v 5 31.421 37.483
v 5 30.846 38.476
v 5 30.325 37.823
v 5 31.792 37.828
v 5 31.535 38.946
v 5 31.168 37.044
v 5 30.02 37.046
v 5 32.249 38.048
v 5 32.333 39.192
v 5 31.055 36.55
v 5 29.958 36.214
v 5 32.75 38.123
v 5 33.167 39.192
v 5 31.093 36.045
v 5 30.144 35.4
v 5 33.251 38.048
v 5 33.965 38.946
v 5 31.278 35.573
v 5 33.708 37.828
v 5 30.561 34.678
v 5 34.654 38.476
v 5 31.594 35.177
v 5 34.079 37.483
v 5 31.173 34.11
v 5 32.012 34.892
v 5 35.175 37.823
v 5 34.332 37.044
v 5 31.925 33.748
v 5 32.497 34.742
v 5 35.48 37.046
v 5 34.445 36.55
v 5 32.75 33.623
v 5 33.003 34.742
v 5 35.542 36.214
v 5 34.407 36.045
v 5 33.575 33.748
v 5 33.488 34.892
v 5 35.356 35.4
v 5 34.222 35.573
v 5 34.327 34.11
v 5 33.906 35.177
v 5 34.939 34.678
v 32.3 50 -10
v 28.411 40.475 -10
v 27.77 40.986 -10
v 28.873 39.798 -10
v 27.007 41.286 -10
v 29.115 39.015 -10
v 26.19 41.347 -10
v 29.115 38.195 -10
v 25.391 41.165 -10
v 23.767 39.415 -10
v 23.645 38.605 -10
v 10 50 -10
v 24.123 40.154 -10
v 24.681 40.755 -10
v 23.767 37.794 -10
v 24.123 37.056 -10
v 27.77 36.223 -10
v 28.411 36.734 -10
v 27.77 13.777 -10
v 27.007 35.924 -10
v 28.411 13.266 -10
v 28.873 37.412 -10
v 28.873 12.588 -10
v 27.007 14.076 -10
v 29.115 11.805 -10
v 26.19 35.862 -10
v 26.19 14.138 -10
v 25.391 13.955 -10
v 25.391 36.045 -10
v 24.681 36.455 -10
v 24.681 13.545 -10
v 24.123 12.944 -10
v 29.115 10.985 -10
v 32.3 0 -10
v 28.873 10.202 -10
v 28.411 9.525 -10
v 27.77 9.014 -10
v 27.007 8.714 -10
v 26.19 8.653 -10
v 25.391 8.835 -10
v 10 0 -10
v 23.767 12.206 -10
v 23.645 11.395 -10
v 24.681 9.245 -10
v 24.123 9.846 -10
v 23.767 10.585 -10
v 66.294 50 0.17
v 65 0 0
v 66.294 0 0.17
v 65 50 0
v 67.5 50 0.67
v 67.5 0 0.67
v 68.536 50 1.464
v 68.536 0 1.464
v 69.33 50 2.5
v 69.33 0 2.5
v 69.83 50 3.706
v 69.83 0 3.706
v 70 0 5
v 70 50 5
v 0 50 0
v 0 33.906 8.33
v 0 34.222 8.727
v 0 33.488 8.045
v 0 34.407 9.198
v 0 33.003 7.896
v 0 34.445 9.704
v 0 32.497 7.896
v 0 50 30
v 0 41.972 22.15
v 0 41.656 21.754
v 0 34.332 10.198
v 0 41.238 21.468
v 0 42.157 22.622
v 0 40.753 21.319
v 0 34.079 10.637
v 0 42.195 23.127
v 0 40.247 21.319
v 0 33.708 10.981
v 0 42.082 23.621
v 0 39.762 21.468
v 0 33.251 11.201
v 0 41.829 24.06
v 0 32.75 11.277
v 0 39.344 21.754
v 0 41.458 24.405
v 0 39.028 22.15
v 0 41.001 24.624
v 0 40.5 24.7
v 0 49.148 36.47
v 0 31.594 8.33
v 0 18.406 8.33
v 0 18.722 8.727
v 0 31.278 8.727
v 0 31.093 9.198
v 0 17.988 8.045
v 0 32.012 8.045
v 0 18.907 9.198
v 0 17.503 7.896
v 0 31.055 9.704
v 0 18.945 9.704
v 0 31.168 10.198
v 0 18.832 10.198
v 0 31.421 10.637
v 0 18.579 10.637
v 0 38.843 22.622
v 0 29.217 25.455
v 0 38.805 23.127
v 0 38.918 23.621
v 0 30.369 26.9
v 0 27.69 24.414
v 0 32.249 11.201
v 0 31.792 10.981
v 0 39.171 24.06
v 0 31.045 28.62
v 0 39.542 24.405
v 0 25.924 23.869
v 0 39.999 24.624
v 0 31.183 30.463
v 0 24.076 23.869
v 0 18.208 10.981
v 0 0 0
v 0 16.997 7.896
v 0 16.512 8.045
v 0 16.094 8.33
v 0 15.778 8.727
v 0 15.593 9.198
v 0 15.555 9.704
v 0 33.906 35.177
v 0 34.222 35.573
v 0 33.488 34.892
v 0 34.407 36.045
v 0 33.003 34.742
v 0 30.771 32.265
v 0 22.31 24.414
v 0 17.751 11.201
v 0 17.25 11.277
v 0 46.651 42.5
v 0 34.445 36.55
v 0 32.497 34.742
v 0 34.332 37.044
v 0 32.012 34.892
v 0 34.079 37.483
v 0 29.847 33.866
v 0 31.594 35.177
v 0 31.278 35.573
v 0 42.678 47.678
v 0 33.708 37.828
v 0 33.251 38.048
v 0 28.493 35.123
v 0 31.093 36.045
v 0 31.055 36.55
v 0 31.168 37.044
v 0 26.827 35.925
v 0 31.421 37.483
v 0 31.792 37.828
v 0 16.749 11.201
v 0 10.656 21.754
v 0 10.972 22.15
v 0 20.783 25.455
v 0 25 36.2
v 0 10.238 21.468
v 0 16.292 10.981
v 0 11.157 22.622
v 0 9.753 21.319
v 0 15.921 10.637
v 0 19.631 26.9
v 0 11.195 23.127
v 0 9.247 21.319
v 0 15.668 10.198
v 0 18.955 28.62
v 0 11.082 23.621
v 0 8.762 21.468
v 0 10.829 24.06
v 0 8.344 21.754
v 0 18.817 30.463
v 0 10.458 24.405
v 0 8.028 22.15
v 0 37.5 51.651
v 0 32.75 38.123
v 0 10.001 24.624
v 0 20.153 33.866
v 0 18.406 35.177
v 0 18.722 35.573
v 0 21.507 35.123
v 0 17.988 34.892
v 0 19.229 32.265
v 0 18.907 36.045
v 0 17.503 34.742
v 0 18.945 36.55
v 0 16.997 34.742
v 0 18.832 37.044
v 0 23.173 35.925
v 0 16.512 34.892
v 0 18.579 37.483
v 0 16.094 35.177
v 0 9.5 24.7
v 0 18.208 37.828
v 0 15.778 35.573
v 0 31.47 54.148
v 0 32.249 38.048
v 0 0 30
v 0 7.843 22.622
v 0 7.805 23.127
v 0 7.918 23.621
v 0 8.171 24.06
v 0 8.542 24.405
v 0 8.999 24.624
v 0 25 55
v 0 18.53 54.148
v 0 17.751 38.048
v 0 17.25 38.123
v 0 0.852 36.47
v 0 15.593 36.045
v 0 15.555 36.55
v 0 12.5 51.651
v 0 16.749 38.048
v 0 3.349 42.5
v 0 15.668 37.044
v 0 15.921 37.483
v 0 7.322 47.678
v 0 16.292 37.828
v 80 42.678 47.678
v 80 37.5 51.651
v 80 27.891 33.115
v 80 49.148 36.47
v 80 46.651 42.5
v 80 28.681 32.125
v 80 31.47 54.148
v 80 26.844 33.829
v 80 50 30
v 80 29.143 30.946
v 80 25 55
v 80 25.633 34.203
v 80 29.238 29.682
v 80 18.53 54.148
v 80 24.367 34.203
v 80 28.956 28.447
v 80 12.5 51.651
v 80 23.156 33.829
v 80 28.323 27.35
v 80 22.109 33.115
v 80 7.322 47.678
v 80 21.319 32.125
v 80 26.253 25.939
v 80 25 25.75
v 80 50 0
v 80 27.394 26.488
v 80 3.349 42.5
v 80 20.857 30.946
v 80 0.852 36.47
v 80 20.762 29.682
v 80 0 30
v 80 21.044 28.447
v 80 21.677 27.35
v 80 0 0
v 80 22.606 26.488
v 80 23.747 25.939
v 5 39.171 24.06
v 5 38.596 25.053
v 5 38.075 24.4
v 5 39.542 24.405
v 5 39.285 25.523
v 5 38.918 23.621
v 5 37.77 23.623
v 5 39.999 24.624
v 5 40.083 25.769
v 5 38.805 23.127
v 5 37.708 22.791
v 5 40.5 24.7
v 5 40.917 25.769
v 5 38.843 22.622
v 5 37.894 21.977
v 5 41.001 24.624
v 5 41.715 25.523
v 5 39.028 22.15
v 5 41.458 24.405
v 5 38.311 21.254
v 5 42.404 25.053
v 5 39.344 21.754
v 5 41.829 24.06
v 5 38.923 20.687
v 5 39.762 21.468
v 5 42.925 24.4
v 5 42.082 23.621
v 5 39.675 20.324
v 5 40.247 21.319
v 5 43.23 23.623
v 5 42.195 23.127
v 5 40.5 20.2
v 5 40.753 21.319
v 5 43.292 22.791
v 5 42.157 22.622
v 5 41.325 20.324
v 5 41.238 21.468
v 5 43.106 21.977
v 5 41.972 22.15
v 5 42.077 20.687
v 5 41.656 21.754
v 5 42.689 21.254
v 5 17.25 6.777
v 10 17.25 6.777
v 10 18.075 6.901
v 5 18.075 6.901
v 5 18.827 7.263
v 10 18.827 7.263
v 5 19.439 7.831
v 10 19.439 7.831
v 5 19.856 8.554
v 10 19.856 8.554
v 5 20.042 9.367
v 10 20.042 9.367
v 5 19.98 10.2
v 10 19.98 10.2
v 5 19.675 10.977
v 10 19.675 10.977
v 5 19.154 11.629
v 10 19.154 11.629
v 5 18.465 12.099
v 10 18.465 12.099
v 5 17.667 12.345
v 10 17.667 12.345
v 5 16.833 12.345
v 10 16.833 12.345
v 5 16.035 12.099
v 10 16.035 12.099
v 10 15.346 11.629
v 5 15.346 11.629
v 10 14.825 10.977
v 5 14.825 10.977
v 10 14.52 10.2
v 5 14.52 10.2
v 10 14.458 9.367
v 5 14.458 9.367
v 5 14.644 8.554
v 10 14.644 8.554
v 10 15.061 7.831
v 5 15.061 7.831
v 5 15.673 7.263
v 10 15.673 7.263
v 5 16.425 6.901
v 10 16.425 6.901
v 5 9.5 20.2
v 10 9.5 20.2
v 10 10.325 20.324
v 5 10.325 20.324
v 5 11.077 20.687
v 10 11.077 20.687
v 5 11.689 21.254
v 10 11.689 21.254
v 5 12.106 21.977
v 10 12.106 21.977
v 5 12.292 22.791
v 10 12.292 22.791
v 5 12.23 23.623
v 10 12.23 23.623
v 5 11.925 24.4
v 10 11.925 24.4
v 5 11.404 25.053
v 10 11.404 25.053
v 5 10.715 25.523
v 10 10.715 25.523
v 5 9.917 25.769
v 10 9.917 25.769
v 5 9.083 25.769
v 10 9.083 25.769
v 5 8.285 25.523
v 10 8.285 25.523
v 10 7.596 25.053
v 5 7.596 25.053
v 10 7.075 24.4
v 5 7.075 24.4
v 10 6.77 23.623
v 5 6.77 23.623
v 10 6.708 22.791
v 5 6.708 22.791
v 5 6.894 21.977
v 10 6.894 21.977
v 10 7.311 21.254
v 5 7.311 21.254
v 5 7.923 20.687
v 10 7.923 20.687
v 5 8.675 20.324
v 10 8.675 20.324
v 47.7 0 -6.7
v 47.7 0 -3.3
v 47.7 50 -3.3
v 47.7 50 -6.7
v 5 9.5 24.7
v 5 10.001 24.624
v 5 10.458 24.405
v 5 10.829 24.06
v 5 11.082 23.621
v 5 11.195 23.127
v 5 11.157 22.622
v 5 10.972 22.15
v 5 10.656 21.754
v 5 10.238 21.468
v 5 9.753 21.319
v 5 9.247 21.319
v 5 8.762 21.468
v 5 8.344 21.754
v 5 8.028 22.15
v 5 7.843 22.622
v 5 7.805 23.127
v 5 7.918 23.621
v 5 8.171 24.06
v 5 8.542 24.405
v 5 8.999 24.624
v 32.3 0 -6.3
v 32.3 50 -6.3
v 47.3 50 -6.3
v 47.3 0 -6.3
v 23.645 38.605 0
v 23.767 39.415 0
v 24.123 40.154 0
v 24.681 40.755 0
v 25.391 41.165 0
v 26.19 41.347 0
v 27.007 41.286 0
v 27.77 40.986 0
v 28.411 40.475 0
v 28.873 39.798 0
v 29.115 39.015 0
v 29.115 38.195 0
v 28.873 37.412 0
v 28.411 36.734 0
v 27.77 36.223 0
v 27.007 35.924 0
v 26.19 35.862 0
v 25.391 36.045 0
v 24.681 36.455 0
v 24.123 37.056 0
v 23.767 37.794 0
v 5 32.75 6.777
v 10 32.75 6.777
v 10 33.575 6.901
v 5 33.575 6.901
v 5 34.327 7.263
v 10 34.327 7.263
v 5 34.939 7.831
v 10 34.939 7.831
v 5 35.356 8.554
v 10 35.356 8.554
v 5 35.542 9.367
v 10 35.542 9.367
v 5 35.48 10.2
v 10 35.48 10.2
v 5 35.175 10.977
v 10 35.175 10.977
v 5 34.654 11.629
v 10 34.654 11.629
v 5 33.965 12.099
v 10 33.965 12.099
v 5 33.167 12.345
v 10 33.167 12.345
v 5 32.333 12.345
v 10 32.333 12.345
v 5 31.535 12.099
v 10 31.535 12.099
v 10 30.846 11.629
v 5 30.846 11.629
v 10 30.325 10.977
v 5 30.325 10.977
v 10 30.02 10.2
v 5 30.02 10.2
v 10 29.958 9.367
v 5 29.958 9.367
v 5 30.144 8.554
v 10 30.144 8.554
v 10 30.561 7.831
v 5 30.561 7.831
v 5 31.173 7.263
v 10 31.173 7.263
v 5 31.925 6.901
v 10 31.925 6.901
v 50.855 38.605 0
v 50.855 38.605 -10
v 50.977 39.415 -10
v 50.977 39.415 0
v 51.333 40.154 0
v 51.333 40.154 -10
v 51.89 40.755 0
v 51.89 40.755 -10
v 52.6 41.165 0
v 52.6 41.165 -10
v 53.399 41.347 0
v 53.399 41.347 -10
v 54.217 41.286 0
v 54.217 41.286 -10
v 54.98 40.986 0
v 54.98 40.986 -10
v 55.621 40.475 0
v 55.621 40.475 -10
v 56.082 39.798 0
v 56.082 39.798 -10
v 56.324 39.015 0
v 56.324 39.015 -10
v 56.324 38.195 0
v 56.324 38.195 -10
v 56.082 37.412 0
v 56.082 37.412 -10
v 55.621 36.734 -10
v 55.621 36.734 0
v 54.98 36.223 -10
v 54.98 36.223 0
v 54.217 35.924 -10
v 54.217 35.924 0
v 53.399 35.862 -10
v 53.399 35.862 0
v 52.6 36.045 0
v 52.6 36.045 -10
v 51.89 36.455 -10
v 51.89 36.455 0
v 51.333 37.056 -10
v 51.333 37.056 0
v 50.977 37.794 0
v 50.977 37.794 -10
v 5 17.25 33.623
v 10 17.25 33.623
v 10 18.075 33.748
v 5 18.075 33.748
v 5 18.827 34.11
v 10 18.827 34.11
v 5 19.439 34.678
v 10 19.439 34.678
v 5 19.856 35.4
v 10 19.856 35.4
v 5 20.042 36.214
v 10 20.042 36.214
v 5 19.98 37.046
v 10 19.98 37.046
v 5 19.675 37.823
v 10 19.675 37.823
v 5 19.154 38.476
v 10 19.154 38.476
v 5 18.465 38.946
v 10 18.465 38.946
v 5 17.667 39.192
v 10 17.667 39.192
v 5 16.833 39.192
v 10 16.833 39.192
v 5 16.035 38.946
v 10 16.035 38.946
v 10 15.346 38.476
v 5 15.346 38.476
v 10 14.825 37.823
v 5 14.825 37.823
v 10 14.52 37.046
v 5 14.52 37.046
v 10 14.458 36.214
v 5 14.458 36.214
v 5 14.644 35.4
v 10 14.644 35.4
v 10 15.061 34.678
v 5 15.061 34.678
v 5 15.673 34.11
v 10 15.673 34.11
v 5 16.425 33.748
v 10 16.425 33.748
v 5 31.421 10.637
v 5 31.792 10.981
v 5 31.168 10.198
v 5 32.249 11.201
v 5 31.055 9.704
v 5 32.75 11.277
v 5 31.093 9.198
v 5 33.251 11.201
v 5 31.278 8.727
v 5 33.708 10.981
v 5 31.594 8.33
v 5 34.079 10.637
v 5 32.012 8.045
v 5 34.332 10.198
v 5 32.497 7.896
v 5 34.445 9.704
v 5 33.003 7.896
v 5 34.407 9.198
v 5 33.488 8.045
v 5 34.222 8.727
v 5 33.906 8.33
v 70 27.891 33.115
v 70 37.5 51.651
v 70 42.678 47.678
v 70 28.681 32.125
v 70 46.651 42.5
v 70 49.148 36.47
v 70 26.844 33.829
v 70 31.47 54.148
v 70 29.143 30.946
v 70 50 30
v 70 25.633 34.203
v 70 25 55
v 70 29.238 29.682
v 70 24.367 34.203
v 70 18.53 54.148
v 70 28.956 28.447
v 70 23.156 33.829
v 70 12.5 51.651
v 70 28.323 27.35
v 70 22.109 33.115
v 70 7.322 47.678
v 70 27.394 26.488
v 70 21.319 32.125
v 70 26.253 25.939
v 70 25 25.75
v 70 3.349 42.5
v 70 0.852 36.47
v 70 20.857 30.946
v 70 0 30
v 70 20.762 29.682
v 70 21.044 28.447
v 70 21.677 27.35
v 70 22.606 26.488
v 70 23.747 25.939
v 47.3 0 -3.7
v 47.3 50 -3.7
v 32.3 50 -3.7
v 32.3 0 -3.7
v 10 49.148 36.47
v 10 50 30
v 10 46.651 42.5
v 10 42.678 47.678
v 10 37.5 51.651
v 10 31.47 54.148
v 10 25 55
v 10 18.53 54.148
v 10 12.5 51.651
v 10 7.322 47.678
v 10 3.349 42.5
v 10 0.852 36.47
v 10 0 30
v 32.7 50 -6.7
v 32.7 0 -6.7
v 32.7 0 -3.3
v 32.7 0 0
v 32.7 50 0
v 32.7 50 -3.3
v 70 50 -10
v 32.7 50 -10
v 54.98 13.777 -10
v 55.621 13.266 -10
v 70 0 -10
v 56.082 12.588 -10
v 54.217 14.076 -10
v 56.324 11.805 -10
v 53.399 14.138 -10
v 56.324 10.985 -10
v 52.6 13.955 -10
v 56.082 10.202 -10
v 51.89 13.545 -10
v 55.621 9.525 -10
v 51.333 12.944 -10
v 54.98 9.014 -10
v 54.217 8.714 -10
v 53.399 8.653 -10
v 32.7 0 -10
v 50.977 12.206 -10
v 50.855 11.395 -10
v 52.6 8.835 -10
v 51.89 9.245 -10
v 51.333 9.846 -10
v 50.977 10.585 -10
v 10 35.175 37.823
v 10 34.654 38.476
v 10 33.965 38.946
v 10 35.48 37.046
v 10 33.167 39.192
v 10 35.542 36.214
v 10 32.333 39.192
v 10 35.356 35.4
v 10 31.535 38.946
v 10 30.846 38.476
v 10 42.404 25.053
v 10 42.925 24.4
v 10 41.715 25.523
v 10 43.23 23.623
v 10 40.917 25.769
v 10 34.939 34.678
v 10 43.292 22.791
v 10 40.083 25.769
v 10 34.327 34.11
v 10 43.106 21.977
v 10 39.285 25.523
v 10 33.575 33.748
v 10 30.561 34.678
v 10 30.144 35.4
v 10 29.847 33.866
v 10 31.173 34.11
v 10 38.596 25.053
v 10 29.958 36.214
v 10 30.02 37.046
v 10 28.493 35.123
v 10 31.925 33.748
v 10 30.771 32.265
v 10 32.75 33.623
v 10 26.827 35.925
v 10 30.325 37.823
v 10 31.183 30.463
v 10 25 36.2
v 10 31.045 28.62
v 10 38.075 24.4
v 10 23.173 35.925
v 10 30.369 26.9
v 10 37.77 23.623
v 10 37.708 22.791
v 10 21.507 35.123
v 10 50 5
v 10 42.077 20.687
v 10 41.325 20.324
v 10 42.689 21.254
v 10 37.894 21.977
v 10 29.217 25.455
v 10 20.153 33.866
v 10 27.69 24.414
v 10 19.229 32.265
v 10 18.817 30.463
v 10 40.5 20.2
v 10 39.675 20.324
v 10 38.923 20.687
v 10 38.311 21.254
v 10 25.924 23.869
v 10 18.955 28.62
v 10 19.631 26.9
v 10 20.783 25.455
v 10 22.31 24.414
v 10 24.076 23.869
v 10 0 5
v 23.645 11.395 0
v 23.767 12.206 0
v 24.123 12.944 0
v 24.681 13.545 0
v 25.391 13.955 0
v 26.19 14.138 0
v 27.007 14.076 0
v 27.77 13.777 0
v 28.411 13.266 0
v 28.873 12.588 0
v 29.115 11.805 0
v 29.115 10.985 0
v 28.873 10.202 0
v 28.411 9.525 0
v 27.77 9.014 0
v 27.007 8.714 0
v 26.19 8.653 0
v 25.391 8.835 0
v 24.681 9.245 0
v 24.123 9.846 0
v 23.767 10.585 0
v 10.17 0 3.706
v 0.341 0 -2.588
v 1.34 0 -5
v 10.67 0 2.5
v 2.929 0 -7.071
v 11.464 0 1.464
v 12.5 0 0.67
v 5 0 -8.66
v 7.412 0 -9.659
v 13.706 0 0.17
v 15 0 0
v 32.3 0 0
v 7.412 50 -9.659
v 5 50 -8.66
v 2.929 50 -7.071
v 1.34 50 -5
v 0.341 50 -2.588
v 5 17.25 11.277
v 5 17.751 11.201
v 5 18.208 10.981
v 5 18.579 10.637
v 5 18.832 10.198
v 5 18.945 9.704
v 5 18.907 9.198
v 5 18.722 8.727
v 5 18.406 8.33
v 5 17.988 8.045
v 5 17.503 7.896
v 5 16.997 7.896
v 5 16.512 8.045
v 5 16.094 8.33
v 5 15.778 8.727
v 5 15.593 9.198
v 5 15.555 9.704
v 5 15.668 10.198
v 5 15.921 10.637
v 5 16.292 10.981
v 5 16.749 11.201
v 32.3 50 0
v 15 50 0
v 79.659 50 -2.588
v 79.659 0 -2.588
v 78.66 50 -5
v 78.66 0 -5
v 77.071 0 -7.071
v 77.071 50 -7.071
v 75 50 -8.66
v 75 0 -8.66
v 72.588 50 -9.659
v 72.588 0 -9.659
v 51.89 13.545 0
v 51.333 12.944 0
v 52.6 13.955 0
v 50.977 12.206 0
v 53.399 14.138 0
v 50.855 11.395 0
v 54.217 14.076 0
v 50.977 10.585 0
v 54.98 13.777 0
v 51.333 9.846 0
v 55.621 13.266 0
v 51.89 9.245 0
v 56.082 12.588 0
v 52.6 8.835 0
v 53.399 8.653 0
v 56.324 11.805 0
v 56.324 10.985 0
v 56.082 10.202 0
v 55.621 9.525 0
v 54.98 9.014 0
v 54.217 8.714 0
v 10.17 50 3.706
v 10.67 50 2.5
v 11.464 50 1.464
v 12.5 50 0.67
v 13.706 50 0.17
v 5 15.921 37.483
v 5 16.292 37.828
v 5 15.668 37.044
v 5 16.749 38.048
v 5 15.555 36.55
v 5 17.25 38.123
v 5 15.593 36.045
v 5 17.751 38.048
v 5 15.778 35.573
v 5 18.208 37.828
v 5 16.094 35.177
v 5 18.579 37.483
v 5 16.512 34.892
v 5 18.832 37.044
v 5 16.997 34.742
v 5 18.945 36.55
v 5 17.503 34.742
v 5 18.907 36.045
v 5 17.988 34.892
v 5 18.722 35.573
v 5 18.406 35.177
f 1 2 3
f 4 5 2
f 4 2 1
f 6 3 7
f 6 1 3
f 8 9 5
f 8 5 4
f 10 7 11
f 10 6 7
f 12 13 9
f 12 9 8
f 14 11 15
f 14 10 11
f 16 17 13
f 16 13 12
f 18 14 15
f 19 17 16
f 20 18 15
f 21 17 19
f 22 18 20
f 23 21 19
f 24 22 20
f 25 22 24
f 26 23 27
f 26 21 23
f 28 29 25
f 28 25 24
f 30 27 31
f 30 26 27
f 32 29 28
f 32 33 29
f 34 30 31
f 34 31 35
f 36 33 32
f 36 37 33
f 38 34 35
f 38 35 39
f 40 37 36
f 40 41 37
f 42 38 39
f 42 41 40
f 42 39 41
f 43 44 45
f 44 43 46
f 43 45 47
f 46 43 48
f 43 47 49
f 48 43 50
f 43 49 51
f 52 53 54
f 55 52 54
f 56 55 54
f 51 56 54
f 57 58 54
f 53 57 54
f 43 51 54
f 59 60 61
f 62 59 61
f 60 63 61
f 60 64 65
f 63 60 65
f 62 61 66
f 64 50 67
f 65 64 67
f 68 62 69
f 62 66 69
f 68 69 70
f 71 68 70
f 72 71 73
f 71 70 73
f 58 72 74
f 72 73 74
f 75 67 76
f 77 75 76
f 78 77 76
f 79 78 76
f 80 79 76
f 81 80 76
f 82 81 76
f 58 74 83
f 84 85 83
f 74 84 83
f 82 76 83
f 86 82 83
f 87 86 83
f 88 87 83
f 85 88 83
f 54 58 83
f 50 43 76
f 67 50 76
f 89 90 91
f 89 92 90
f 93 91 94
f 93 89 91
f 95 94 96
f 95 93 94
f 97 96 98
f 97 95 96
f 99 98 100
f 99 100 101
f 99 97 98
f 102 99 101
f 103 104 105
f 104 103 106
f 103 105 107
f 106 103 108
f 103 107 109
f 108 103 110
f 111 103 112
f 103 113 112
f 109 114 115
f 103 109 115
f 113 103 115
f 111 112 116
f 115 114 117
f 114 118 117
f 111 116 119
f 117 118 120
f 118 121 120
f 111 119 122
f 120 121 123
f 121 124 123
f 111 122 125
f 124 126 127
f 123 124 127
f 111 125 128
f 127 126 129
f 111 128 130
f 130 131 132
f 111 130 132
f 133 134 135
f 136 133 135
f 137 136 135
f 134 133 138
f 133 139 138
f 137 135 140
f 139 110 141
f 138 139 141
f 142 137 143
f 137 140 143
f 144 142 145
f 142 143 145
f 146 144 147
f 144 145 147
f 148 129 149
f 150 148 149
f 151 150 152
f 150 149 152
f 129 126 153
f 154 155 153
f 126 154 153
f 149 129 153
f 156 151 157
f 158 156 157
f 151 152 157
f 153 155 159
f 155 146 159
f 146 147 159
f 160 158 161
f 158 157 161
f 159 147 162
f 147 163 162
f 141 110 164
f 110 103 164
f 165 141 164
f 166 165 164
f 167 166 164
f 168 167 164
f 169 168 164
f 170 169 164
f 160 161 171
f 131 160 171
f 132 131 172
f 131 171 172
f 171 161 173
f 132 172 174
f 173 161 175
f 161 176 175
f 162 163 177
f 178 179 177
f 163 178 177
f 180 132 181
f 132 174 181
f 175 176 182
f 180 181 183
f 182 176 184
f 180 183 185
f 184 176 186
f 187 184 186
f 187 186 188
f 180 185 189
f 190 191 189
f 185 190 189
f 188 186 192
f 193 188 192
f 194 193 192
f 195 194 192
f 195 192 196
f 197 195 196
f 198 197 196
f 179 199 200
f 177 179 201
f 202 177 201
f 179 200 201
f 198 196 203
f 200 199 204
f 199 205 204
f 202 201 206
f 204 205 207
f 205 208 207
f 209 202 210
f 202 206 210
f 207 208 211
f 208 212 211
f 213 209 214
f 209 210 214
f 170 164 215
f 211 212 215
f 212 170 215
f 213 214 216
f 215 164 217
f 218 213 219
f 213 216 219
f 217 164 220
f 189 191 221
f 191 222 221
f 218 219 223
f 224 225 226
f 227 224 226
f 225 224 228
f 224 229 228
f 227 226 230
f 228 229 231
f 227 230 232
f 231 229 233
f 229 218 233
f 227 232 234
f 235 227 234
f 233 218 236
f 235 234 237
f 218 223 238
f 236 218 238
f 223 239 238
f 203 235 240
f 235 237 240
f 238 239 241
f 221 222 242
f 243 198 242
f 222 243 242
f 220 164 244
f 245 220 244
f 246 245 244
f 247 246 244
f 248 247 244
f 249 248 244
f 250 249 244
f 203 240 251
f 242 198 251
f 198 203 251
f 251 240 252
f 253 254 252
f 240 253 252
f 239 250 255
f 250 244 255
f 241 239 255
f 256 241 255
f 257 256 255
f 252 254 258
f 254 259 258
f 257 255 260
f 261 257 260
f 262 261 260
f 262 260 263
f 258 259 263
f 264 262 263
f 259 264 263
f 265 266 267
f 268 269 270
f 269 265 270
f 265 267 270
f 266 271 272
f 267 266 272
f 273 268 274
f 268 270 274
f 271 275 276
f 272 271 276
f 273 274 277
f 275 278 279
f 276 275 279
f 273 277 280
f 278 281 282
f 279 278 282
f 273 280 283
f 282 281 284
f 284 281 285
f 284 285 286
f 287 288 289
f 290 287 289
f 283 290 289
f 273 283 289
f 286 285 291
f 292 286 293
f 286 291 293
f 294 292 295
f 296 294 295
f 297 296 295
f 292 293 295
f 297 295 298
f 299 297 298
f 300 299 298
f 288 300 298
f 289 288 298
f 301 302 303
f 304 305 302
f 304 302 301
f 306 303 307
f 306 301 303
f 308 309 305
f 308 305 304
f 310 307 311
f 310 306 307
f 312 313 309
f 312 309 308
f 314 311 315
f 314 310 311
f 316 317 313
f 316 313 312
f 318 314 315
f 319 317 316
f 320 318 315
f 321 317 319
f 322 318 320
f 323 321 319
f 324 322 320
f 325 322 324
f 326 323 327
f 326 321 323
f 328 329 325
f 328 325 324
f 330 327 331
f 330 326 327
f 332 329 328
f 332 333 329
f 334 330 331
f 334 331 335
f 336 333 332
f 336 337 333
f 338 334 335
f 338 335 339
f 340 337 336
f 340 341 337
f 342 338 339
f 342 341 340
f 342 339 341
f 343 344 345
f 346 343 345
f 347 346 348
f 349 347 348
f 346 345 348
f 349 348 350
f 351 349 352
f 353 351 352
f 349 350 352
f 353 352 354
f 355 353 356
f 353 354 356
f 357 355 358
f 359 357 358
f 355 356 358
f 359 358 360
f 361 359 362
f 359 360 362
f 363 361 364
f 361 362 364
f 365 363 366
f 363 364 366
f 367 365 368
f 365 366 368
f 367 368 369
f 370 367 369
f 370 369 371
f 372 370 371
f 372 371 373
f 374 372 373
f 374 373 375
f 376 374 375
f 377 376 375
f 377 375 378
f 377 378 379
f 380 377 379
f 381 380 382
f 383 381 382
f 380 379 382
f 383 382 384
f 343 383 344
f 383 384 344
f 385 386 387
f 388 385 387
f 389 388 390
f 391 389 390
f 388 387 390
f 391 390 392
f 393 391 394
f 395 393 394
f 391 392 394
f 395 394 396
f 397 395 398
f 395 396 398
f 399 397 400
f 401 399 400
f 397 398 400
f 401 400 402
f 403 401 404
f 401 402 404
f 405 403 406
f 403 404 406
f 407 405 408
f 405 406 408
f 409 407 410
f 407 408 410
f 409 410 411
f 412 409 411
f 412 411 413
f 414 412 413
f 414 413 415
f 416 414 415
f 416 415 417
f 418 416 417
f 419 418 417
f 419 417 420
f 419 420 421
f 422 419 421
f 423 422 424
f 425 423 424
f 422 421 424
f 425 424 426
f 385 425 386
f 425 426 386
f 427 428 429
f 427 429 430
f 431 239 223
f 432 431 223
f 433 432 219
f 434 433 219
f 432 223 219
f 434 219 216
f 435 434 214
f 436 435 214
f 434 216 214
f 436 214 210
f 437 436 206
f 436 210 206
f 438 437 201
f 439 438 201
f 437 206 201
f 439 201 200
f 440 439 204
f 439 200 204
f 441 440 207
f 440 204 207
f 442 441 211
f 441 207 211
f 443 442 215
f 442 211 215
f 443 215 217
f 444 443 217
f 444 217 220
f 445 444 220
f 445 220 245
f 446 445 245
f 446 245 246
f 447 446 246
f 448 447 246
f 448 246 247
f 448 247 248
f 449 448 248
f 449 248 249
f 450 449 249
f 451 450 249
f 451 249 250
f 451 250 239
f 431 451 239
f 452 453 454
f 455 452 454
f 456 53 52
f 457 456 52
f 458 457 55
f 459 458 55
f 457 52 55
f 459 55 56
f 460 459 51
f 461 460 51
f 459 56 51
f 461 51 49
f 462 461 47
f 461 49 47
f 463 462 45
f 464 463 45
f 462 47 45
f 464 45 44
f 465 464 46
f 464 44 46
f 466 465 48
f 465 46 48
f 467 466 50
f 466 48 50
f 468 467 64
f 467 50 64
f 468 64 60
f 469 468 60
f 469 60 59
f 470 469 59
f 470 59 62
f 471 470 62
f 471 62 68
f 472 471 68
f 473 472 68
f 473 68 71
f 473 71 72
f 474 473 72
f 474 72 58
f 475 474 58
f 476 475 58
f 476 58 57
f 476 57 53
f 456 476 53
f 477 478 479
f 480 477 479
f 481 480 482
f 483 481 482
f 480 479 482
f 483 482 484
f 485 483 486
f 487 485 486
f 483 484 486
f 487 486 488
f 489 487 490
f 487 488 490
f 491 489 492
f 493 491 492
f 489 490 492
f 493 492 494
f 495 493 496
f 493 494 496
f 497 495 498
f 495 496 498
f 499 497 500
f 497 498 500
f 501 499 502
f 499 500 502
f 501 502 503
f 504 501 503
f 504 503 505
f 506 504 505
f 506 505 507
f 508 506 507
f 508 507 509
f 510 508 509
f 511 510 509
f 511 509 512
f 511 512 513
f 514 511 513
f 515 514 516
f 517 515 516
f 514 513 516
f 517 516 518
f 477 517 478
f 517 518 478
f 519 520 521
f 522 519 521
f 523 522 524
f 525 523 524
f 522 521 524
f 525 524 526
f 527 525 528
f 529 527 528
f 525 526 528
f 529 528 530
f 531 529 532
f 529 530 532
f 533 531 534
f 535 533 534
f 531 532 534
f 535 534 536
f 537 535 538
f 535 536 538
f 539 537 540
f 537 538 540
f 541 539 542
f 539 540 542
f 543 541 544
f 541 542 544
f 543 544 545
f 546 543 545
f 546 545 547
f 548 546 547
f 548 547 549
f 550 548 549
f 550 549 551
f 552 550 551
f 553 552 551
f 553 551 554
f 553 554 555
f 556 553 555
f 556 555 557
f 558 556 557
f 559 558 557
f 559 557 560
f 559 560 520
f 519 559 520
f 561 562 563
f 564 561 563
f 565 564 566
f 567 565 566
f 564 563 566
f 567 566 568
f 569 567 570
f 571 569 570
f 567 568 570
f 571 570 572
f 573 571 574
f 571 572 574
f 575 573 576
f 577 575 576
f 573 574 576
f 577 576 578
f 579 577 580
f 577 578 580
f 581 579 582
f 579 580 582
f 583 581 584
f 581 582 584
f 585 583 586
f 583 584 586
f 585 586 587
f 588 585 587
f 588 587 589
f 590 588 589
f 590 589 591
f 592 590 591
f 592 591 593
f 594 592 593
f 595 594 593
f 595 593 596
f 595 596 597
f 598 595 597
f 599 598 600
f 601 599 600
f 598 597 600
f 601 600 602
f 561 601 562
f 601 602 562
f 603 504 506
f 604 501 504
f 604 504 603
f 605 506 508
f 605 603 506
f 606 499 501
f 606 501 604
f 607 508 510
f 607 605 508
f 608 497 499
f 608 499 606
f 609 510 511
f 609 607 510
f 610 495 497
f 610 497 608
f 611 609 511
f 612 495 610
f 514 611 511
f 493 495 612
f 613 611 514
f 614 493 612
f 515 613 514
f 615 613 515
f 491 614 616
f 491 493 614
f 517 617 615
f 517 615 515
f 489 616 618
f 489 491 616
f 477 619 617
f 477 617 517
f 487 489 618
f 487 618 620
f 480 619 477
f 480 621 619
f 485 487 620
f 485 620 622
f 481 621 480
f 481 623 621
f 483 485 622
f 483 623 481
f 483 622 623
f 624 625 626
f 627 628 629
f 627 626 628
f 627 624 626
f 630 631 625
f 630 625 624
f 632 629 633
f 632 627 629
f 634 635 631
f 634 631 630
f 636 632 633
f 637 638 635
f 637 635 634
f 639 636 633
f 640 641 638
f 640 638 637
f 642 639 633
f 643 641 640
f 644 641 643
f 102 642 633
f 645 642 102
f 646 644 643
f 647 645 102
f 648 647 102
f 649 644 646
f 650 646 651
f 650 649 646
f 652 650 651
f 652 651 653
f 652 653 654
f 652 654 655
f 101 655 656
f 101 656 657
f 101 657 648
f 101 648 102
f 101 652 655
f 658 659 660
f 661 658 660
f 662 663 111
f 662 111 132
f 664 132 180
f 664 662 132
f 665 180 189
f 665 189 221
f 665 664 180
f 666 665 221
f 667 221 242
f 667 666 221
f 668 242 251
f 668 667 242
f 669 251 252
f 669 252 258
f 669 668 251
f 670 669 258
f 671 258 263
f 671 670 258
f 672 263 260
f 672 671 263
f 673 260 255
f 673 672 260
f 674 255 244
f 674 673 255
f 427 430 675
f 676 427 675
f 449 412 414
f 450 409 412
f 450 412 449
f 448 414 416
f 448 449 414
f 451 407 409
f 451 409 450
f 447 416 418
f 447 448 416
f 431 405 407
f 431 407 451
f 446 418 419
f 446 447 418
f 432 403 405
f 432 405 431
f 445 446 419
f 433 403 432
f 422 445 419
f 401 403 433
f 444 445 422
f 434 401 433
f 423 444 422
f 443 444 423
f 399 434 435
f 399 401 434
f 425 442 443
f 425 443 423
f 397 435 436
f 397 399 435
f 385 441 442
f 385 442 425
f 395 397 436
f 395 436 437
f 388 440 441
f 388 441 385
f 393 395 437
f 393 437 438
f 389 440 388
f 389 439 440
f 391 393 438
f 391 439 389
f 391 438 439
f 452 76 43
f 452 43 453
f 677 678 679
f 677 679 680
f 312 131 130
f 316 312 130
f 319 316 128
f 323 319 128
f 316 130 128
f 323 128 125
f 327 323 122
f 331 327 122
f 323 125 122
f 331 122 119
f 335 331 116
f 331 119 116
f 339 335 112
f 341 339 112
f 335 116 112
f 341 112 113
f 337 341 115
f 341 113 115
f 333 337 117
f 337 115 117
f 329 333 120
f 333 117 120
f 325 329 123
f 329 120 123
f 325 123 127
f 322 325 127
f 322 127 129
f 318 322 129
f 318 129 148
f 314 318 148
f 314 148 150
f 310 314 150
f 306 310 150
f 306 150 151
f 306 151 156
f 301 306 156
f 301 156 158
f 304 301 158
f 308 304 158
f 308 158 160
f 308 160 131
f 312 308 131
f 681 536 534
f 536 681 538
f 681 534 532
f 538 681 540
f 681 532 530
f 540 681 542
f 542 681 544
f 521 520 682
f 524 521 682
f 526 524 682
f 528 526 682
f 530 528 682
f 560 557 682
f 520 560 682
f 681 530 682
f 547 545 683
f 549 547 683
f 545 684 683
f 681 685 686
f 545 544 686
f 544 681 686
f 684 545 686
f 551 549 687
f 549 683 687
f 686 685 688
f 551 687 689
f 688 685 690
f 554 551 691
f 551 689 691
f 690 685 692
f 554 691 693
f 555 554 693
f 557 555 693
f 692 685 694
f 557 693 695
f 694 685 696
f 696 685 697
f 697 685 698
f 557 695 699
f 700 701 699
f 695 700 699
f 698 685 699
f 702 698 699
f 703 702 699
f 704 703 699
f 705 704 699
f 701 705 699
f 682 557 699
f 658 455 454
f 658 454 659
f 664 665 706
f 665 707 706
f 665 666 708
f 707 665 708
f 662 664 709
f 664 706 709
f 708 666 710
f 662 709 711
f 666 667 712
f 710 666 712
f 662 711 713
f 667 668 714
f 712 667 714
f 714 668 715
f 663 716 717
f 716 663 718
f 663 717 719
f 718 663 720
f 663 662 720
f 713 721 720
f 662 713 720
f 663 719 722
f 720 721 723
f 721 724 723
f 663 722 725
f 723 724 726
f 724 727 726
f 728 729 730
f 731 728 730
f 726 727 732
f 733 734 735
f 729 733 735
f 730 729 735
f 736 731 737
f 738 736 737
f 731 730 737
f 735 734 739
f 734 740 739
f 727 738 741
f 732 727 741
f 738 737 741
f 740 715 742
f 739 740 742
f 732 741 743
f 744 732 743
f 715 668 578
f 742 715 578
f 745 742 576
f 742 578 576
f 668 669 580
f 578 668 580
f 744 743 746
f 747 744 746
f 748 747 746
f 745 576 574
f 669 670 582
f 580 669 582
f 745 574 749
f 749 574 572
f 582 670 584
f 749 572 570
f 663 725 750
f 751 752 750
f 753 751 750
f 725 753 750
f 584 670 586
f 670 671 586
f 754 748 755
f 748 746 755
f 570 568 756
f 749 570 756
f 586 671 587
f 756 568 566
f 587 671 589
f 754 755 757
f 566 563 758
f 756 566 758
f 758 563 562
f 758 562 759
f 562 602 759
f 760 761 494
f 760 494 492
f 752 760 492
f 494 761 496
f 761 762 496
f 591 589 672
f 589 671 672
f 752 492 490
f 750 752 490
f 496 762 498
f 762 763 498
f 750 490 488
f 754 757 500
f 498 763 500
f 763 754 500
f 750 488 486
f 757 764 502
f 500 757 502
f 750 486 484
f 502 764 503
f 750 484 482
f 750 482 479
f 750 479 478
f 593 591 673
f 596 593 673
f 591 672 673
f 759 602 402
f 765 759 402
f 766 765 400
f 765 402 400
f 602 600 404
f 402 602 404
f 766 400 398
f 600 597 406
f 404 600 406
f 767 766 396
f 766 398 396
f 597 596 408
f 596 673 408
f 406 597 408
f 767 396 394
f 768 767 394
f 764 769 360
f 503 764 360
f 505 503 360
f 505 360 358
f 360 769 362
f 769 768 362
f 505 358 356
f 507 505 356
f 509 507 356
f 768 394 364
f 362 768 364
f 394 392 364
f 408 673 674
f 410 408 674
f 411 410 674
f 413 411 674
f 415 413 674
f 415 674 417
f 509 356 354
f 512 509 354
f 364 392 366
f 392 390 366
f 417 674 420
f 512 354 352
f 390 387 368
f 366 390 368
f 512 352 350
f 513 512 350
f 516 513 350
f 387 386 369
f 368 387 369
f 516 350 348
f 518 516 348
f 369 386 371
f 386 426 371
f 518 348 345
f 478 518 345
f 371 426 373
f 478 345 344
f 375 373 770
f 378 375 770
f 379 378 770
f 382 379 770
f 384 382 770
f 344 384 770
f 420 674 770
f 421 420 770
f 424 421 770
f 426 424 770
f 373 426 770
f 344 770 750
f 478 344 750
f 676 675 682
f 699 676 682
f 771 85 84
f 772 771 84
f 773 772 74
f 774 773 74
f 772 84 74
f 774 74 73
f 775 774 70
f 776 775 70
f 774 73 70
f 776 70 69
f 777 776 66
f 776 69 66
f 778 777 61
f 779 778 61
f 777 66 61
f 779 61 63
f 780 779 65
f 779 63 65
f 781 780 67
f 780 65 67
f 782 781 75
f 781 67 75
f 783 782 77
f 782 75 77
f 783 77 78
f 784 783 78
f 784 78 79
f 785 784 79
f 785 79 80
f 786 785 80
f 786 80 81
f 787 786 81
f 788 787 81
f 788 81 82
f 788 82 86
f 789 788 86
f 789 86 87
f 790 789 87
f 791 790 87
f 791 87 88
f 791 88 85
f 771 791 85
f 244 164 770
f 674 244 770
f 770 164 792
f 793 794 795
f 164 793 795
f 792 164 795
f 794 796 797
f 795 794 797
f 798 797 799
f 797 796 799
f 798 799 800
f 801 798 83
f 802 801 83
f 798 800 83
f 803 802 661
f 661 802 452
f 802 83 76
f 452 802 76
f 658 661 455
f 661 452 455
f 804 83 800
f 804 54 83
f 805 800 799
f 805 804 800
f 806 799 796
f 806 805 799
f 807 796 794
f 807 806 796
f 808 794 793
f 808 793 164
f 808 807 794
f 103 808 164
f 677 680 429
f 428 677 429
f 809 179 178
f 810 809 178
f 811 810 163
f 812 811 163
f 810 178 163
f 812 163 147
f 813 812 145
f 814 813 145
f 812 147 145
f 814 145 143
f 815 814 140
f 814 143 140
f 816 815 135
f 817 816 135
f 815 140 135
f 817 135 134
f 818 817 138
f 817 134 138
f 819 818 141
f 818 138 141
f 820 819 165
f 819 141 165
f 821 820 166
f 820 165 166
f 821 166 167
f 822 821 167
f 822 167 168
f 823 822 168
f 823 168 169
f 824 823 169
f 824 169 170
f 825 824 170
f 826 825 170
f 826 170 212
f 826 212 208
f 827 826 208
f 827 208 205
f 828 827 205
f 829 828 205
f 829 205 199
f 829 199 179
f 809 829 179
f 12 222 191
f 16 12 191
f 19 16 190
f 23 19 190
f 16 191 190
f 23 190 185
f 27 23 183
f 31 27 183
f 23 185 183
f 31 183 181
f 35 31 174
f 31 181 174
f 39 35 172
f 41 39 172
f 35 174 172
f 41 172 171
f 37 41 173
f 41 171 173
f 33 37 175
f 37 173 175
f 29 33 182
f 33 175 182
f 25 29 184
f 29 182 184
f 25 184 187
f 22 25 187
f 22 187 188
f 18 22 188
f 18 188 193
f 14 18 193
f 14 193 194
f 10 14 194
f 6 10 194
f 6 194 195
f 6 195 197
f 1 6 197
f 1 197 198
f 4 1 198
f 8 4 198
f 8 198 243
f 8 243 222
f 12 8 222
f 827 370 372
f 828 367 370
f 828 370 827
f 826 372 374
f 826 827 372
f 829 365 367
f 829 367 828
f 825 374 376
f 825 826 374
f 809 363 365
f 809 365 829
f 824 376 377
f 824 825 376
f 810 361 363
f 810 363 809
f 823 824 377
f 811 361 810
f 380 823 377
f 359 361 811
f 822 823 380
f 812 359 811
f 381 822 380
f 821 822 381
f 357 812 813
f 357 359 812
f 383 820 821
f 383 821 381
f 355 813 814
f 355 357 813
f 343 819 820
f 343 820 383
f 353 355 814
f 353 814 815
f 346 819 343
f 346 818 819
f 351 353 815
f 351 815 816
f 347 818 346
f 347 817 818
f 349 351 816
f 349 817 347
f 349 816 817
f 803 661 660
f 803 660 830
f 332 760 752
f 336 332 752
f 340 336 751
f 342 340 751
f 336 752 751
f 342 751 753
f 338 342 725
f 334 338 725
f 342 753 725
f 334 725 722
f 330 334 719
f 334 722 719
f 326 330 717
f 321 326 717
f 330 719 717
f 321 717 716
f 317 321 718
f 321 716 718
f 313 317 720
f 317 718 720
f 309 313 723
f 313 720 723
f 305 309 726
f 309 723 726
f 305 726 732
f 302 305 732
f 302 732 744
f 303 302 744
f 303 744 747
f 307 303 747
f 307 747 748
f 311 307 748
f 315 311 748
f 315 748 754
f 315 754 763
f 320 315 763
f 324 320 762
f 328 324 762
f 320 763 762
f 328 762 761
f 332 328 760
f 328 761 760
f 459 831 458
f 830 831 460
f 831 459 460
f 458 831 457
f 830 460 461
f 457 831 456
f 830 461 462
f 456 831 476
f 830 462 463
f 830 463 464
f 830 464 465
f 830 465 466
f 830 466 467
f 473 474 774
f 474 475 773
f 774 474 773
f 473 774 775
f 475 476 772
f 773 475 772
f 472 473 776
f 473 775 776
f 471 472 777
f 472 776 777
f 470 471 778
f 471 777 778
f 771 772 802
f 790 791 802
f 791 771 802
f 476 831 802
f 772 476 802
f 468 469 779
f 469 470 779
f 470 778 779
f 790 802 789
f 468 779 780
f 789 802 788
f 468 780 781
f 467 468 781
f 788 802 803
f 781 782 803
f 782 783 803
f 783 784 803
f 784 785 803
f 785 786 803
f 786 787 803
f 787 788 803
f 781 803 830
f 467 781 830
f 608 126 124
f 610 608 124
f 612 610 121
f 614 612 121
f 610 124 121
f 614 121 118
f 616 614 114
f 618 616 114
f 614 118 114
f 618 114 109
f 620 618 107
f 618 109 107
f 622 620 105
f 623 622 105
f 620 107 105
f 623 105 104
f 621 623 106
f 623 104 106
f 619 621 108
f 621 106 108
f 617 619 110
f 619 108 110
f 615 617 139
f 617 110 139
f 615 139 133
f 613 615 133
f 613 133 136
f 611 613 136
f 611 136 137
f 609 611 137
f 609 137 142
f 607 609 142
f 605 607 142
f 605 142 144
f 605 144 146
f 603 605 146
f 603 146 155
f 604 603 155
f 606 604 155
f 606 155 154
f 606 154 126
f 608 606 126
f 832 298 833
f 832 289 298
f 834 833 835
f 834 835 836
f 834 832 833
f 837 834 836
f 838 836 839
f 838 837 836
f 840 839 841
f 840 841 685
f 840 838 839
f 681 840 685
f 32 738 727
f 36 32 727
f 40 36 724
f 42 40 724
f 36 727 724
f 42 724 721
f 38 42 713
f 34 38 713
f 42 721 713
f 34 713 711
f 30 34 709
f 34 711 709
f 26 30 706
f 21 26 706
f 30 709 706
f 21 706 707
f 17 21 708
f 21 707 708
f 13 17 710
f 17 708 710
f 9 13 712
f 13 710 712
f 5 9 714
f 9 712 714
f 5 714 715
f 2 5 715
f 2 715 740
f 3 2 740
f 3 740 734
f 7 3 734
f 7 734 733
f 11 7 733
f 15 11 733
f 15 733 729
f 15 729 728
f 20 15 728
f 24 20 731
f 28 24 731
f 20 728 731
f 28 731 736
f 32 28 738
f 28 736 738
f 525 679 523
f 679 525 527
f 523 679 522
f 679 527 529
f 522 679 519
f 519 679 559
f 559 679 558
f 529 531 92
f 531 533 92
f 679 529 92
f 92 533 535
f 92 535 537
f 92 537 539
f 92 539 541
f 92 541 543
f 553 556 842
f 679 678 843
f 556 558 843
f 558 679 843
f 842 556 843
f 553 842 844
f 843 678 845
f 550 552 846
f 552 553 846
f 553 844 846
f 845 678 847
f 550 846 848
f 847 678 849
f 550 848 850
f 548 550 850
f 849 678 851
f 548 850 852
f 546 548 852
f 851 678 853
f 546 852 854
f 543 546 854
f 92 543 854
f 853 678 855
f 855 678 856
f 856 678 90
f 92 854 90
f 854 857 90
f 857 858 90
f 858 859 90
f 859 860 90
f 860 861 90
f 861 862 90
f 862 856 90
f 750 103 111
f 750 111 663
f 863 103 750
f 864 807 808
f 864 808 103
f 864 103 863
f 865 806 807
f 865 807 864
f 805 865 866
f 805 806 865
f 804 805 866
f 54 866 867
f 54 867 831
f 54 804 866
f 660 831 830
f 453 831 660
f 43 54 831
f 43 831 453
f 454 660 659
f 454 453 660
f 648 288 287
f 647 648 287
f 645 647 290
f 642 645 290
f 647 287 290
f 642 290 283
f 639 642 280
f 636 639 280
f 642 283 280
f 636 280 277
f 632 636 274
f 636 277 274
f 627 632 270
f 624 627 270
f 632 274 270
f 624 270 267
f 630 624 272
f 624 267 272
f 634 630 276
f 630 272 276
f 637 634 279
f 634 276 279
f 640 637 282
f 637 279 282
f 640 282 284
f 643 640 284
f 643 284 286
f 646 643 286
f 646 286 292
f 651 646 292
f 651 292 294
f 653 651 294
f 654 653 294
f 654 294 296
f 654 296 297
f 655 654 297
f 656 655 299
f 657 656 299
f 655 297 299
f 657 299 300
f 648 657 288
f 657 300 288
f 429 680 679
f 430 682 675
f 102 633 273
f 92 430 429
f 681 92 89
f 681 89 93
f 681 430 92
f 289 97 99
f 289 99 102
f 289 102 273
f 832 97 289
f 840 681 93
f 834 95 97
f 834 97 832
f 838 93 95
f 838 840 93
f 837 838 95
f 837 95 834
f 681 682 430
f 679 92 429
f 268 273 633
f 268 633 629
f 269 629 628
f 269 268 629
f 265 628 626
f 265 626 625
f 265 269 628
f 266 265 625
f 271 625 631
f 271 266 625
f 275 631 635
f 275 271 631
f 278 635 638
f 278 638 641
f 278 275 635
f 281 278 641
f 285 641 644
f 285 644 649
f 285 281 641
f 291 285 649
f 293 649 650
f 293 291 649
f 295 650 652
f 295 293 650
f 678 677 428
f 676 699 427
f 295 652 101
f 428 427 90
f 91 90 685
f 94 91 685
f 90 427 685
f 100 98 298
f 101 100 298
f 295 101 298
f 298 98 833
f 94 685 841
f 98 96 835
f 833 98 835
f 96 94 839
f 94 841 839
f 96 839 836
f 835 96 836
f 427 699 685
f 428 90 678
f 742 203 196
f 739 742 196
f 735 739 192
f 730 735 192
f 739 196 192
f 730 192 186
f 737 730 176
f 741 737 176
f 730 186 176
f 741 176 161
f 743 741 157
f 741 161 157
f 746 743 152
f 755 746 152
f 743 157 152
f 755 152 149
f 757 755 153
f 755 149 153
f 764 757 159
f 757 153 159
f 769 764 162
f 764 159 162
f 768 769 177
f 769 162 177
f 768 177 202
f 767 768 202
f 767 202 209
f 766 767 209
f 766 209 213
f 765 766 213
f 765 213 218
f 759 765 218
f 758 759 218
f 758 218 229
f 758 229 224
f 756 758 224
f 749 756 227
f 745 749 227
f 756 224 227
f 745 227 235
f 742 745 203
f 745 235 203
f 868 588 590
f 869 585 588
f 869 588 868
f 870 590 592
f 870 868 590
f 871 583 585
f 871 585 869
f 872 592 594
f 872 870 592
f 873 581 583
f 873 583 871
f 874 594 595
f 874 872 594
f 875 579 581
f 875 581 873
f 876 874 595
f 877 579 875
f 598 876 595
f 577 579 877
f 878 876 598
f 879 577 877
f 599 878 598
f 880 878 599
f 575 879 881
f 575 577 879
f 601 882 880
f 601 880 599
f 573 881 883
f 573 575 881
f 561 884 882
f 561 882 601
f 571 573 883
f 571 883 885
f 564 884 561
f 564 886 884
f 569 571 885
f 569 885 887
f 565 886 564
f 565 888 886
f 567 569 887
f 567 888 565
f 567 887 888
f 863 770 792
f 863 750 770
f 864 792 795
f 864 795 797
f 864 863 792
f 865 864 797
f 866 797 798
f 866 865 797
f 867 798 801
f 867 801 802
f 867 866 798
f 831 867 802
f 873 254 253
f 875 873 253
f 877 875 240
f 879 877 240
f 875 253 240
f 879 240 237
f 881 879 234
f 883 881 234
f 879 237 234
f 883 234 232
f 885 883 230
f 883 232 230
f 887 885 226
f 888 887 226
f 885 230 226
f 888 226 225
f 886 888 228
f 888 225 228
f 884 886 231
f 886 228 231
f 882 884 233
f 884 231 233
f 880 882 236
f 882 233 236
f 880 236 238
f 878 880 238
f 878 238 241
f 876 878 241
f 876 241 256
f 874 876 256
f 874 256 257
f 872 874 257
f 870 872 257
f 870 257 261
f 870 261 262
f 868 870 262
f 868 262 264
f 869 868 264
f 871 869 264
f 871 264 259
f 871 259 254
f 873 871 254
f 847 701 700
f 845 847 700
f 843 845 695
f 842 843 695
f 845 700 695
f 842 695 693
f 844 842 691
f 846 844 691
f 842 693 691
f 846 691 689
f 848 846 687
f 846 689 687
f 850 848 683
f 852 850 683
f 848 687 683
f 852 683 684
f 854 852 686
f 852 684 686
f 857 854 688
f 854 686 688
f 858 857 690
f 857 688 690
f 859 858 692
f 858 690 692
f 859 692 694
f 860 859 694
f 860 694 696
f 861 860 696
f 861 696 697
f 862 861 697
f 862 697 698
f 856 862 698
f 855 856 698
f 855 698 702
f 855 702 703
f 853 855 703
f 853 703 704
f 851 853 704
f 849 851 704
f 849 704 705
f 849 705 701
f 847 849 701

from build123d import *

# Parameters (mm, degrees)
SKETCH1_W                    = 10
SKETCH1_H                    = 55
SKETCH1_W_2                  = 60
SKETCH1_H_2                  = 10
BOSS_EXTRUDE1_DEPTH          = 50
SKETCH2_R                    = 2.75
CUT_EXTRUDE1_DEPTH           = 115.564392374
FILLET1_RADIUS               = 25
FILLET1_LENGTH               = 10
FILLET2_RADIUS               = 25
FILLET2_LENGTH               = 10
SKETCH3_R                    = 4.25
CUT_EXTRUDE2_DEPTH           = 10
SKETCH5_R                    = 6.2
SKETCH5_R_2                  = 1.7
CUT_EXTRUDE3_DEPTH           = 10
SKETCH7_R                    = 2.8
CUT_EXTRUDE4_DEPTH           = 5
FILLET3_R                    = 5
FILLET4_R                    = 10
CUT_EXTRUDE_THIN1_DEPTH      = 110.201648339
CUT_EXTRUDE_THIN1_DEPTH_BACK = 110.201648339


with BuildPart() as part:
    # Sketch1 → Boss-Extrude1 (new body)
    with BuildSketch(Plane(origin=(0, 0, 0), x_dir=(1, 0, 0), z_dir=(0, 1, 0))):
        with Locations((5, -27.5)):
            Rectangle(SKETCH1_W, SKETCH1_H)
        with Locations((40, 5)):
            Rectangle(SKETCH1_W_2, SKETCH1_H_2)
        with Locations((75, -27.5)):
            Rectangle(SKETCH1_W, SKETCH1_H)
        with Locations((75, 5)):
            Rectangle(SKETCH1_W, SKETCH1_H_2)
        with Locations((5, 5)):
            Rectangle(SKETCH1_W, SKETCH1_H_2)
    extrude(amount=BOSS_EXTRUDE1_DEPTH)

    # Sketch2 → Cut-Extrude1 (cut, through all)
    with BuildSketch(Plane(origin=(0, 0, -10), x_dir=(-1, 0, 0), z_dir=(0, 0, -1))):
        with Locations((-26.39526553, 38.60473447)):
            Circle(SKETCH2_R)
        with Locations((-53.60473447, 38.60473447)):
            Circle(SKETCH2_R)
        with Locations((-53.60473447, 11.39526553)):
            Circle(SKETCH2_R)
        with Locations((-26.39526553, 11.39526553)):
            Circle(SKETCH2_R)
    extrude(amount=-CUT_EXTRUDE1_DEPTH, mode=Mode.SUBTRACT)

    # Fillet1: full round fillet: the end face becomes a half cylinder, R = half its width
    fillet1_face = Plane((75, 25, 55), x_dir=(1, 0, 0), z_dir=(0, 0, 1))  # on the end face: x along it, z out of the body
    fillet1_slab = fillet1_face.offset(-FILLET1_RADIUS / 2) * Box(FILLET1_LENGTH, 2 * FILLET1_RADIUS, FILLET1_RADIUS, mode=Mode.PRIVATE)  # the body's end, R deep
    fillet1_round = Plane((75, 25, 30), x_dir=(0, 0, 1), z_dir=(1, 0, 0)) * Cylinder(FILLET1_RADIUS, FILLET1_LENGTH, mode=Mode.PRIVATE)  # its axis R under the face
    add(fillet1_slab - fillet1_round, mode=Mode.SUBTRACT)

    # Fillet2: full round fillet: the end face becomes a half cylinder, R = half its width
    fillet2_face = Plane((5, 25, 55), x_dir=(1, 0, 0), z_dir=(0, 0, 1))  # on the end face: x along it, z out of the body
    fillet2_slab = fillet2_face.offset(-FILLET2_RADIUS / 2) * Box(FILLET2_LENGTH, 2 * FILLET2_RADIUS, FILLET2_RADIUS, mode=Mode.PRIVATE)  # the body's end, R deep
    fillet2_round = Plane((5, 25, 30), x_dir=(0, 0, 1), z_dir=(1, 0, 0)) * Cylinder(FILLET2_RADIUS, FILLET2_LENGTH, mode=Mode.PRIVATE)  # its axis R under the face
    add(fillet2_slab - fillet2_round, mode=Mode.SUBTRACT)

    # Sketch3 → Cut-Extrude2 (cut)
    with BuildSketch(Plane(origin=(80, 0, 0), x_dir=(0, 0, -1), z_dir=(1, 0, 0))):
        with Locations((-30, 25)):
            Circle(SKETCH3_R)
    extrude(amount=-CUT_EXTRUDE2_DEPTH, mode=Mode.SUBTRACT)

    # Sketch5 → Cut-Extrude3 (cut)
    with BuildSketch(Plane.ZY):
        with Locations((30, 25)):
            Circle(SKETCH5_R)
        with Locations((23, 9.5)):
            Circle(SKETCH5_R_2)
        with Locations((9.576606241, 17.25)):
            Circle(SKETCH5_R_2)
        with Locations((9.576606241, 32.75)):
            Circle(SKETCH5_R_2)
        with Locations((23, 40.5)):
            Circle(SKETCH5_R_2)
        with Locations((36.423393759, 32.75)):
            Circle(SKETCH5_R_2)
        with Locations((36.423393759, 17.25)):
            Circle(SKETCH5_R_2)
    extrude(amount=-CUT_EXTRUDE3_DEPTH, mode=Mode.SUBTRACT)

    # Sketch7 → Cut-Extrude4 (cut)
    with BuildSketch(Plane(origin=(10, 0, 0), x_dir=(0, 0, -1), z_dir=(1, 0, 0))):
        with Locations((-23, 9.5)):
            Circle(SKETCH7_R)
        with Locations((-36.423393759, 17.25)):
            Circle(SKETCH7_R)
        with Locations((-36.423393759, 32.75)):
            Circle(SKETCH7_R)
        with Locations((-23, 40.5)):
            Circle(SKETCH7_R)
        with Locations((-9.576606241, 32.75)):
            Circle(SKETCH7_R)
        with Locations((-9.576606241, 17.25)):
            Circle(SKETCH7_R)
    extrude(amount=-CUT_EXTRUDE4_DEPTH, mode=Mode.SUBTRACT)

    # Fillet3
    fillet3_edges = [part.edges().sort_by_distance(p)[0] for p in [
        (70, 25, 0),
        (10, 25, 0),
    ]]
    fillet(fillet3_edges, radius=FILLET3_R)

    # Fillet4
    fillet4_edges = [part.edges().sort_by_distance(p)[0] for p in [
        (0, 25, -10),
        (80, 25, -10),
    ]]
    fillet(fillet4_edges, radius=FILLET4_R)

    # Sketch8 → Cut-Extrude-Thin1 (cut, two sides: drawn at the far end of the back side and taken through both)
    with BuildSketch(Plane(origin=(0, 50, 0), x_dir=(1, 0, 0), z_dir=(0, 1, 0)).offset(-CUT_EXTRUDE_THIN1_DEPTH_BACK)):
        Polygon((32.3, 10), (32.3, 6.3), (47.3, 6.3), (47.3, 3.7), (32.3, 3.7), (32.3, 0), (32.7, 0), (32.7, 3.3), (47.7, 3.3), (47.7, 6.7), (32.7, 6.7), (32.7, 10), align=None)
    extrude(amount=CUT_EXTRUDE_THIN1_DEPTH + CUT_EXTRUDE_THIN1_DEPTH_BACK, mode=Mode.SUBTRACT)


with BuildPart() as cut_extrude_thin1_piece_1:
    # of the separate pieces the step leaves, piece 1, a body of its own (cut_extrude_thin1_pieces)
    add(part.part.solids().sort_by_distance((80, 50, 0))[0])


with BuildPart() as cut_extrude_thin1_piece_2:
    # of the separate pieces the step leaves, piece 2, a body of its own (cut_extrude_thin1_pieces)
    add(part.part.solids().sort_by_distance((32.3, 50, -6.3))[0])


solid = Compound([cut_extrude_thin1_piece_1.part, cut_extrude_thin1_piece_2.part])
